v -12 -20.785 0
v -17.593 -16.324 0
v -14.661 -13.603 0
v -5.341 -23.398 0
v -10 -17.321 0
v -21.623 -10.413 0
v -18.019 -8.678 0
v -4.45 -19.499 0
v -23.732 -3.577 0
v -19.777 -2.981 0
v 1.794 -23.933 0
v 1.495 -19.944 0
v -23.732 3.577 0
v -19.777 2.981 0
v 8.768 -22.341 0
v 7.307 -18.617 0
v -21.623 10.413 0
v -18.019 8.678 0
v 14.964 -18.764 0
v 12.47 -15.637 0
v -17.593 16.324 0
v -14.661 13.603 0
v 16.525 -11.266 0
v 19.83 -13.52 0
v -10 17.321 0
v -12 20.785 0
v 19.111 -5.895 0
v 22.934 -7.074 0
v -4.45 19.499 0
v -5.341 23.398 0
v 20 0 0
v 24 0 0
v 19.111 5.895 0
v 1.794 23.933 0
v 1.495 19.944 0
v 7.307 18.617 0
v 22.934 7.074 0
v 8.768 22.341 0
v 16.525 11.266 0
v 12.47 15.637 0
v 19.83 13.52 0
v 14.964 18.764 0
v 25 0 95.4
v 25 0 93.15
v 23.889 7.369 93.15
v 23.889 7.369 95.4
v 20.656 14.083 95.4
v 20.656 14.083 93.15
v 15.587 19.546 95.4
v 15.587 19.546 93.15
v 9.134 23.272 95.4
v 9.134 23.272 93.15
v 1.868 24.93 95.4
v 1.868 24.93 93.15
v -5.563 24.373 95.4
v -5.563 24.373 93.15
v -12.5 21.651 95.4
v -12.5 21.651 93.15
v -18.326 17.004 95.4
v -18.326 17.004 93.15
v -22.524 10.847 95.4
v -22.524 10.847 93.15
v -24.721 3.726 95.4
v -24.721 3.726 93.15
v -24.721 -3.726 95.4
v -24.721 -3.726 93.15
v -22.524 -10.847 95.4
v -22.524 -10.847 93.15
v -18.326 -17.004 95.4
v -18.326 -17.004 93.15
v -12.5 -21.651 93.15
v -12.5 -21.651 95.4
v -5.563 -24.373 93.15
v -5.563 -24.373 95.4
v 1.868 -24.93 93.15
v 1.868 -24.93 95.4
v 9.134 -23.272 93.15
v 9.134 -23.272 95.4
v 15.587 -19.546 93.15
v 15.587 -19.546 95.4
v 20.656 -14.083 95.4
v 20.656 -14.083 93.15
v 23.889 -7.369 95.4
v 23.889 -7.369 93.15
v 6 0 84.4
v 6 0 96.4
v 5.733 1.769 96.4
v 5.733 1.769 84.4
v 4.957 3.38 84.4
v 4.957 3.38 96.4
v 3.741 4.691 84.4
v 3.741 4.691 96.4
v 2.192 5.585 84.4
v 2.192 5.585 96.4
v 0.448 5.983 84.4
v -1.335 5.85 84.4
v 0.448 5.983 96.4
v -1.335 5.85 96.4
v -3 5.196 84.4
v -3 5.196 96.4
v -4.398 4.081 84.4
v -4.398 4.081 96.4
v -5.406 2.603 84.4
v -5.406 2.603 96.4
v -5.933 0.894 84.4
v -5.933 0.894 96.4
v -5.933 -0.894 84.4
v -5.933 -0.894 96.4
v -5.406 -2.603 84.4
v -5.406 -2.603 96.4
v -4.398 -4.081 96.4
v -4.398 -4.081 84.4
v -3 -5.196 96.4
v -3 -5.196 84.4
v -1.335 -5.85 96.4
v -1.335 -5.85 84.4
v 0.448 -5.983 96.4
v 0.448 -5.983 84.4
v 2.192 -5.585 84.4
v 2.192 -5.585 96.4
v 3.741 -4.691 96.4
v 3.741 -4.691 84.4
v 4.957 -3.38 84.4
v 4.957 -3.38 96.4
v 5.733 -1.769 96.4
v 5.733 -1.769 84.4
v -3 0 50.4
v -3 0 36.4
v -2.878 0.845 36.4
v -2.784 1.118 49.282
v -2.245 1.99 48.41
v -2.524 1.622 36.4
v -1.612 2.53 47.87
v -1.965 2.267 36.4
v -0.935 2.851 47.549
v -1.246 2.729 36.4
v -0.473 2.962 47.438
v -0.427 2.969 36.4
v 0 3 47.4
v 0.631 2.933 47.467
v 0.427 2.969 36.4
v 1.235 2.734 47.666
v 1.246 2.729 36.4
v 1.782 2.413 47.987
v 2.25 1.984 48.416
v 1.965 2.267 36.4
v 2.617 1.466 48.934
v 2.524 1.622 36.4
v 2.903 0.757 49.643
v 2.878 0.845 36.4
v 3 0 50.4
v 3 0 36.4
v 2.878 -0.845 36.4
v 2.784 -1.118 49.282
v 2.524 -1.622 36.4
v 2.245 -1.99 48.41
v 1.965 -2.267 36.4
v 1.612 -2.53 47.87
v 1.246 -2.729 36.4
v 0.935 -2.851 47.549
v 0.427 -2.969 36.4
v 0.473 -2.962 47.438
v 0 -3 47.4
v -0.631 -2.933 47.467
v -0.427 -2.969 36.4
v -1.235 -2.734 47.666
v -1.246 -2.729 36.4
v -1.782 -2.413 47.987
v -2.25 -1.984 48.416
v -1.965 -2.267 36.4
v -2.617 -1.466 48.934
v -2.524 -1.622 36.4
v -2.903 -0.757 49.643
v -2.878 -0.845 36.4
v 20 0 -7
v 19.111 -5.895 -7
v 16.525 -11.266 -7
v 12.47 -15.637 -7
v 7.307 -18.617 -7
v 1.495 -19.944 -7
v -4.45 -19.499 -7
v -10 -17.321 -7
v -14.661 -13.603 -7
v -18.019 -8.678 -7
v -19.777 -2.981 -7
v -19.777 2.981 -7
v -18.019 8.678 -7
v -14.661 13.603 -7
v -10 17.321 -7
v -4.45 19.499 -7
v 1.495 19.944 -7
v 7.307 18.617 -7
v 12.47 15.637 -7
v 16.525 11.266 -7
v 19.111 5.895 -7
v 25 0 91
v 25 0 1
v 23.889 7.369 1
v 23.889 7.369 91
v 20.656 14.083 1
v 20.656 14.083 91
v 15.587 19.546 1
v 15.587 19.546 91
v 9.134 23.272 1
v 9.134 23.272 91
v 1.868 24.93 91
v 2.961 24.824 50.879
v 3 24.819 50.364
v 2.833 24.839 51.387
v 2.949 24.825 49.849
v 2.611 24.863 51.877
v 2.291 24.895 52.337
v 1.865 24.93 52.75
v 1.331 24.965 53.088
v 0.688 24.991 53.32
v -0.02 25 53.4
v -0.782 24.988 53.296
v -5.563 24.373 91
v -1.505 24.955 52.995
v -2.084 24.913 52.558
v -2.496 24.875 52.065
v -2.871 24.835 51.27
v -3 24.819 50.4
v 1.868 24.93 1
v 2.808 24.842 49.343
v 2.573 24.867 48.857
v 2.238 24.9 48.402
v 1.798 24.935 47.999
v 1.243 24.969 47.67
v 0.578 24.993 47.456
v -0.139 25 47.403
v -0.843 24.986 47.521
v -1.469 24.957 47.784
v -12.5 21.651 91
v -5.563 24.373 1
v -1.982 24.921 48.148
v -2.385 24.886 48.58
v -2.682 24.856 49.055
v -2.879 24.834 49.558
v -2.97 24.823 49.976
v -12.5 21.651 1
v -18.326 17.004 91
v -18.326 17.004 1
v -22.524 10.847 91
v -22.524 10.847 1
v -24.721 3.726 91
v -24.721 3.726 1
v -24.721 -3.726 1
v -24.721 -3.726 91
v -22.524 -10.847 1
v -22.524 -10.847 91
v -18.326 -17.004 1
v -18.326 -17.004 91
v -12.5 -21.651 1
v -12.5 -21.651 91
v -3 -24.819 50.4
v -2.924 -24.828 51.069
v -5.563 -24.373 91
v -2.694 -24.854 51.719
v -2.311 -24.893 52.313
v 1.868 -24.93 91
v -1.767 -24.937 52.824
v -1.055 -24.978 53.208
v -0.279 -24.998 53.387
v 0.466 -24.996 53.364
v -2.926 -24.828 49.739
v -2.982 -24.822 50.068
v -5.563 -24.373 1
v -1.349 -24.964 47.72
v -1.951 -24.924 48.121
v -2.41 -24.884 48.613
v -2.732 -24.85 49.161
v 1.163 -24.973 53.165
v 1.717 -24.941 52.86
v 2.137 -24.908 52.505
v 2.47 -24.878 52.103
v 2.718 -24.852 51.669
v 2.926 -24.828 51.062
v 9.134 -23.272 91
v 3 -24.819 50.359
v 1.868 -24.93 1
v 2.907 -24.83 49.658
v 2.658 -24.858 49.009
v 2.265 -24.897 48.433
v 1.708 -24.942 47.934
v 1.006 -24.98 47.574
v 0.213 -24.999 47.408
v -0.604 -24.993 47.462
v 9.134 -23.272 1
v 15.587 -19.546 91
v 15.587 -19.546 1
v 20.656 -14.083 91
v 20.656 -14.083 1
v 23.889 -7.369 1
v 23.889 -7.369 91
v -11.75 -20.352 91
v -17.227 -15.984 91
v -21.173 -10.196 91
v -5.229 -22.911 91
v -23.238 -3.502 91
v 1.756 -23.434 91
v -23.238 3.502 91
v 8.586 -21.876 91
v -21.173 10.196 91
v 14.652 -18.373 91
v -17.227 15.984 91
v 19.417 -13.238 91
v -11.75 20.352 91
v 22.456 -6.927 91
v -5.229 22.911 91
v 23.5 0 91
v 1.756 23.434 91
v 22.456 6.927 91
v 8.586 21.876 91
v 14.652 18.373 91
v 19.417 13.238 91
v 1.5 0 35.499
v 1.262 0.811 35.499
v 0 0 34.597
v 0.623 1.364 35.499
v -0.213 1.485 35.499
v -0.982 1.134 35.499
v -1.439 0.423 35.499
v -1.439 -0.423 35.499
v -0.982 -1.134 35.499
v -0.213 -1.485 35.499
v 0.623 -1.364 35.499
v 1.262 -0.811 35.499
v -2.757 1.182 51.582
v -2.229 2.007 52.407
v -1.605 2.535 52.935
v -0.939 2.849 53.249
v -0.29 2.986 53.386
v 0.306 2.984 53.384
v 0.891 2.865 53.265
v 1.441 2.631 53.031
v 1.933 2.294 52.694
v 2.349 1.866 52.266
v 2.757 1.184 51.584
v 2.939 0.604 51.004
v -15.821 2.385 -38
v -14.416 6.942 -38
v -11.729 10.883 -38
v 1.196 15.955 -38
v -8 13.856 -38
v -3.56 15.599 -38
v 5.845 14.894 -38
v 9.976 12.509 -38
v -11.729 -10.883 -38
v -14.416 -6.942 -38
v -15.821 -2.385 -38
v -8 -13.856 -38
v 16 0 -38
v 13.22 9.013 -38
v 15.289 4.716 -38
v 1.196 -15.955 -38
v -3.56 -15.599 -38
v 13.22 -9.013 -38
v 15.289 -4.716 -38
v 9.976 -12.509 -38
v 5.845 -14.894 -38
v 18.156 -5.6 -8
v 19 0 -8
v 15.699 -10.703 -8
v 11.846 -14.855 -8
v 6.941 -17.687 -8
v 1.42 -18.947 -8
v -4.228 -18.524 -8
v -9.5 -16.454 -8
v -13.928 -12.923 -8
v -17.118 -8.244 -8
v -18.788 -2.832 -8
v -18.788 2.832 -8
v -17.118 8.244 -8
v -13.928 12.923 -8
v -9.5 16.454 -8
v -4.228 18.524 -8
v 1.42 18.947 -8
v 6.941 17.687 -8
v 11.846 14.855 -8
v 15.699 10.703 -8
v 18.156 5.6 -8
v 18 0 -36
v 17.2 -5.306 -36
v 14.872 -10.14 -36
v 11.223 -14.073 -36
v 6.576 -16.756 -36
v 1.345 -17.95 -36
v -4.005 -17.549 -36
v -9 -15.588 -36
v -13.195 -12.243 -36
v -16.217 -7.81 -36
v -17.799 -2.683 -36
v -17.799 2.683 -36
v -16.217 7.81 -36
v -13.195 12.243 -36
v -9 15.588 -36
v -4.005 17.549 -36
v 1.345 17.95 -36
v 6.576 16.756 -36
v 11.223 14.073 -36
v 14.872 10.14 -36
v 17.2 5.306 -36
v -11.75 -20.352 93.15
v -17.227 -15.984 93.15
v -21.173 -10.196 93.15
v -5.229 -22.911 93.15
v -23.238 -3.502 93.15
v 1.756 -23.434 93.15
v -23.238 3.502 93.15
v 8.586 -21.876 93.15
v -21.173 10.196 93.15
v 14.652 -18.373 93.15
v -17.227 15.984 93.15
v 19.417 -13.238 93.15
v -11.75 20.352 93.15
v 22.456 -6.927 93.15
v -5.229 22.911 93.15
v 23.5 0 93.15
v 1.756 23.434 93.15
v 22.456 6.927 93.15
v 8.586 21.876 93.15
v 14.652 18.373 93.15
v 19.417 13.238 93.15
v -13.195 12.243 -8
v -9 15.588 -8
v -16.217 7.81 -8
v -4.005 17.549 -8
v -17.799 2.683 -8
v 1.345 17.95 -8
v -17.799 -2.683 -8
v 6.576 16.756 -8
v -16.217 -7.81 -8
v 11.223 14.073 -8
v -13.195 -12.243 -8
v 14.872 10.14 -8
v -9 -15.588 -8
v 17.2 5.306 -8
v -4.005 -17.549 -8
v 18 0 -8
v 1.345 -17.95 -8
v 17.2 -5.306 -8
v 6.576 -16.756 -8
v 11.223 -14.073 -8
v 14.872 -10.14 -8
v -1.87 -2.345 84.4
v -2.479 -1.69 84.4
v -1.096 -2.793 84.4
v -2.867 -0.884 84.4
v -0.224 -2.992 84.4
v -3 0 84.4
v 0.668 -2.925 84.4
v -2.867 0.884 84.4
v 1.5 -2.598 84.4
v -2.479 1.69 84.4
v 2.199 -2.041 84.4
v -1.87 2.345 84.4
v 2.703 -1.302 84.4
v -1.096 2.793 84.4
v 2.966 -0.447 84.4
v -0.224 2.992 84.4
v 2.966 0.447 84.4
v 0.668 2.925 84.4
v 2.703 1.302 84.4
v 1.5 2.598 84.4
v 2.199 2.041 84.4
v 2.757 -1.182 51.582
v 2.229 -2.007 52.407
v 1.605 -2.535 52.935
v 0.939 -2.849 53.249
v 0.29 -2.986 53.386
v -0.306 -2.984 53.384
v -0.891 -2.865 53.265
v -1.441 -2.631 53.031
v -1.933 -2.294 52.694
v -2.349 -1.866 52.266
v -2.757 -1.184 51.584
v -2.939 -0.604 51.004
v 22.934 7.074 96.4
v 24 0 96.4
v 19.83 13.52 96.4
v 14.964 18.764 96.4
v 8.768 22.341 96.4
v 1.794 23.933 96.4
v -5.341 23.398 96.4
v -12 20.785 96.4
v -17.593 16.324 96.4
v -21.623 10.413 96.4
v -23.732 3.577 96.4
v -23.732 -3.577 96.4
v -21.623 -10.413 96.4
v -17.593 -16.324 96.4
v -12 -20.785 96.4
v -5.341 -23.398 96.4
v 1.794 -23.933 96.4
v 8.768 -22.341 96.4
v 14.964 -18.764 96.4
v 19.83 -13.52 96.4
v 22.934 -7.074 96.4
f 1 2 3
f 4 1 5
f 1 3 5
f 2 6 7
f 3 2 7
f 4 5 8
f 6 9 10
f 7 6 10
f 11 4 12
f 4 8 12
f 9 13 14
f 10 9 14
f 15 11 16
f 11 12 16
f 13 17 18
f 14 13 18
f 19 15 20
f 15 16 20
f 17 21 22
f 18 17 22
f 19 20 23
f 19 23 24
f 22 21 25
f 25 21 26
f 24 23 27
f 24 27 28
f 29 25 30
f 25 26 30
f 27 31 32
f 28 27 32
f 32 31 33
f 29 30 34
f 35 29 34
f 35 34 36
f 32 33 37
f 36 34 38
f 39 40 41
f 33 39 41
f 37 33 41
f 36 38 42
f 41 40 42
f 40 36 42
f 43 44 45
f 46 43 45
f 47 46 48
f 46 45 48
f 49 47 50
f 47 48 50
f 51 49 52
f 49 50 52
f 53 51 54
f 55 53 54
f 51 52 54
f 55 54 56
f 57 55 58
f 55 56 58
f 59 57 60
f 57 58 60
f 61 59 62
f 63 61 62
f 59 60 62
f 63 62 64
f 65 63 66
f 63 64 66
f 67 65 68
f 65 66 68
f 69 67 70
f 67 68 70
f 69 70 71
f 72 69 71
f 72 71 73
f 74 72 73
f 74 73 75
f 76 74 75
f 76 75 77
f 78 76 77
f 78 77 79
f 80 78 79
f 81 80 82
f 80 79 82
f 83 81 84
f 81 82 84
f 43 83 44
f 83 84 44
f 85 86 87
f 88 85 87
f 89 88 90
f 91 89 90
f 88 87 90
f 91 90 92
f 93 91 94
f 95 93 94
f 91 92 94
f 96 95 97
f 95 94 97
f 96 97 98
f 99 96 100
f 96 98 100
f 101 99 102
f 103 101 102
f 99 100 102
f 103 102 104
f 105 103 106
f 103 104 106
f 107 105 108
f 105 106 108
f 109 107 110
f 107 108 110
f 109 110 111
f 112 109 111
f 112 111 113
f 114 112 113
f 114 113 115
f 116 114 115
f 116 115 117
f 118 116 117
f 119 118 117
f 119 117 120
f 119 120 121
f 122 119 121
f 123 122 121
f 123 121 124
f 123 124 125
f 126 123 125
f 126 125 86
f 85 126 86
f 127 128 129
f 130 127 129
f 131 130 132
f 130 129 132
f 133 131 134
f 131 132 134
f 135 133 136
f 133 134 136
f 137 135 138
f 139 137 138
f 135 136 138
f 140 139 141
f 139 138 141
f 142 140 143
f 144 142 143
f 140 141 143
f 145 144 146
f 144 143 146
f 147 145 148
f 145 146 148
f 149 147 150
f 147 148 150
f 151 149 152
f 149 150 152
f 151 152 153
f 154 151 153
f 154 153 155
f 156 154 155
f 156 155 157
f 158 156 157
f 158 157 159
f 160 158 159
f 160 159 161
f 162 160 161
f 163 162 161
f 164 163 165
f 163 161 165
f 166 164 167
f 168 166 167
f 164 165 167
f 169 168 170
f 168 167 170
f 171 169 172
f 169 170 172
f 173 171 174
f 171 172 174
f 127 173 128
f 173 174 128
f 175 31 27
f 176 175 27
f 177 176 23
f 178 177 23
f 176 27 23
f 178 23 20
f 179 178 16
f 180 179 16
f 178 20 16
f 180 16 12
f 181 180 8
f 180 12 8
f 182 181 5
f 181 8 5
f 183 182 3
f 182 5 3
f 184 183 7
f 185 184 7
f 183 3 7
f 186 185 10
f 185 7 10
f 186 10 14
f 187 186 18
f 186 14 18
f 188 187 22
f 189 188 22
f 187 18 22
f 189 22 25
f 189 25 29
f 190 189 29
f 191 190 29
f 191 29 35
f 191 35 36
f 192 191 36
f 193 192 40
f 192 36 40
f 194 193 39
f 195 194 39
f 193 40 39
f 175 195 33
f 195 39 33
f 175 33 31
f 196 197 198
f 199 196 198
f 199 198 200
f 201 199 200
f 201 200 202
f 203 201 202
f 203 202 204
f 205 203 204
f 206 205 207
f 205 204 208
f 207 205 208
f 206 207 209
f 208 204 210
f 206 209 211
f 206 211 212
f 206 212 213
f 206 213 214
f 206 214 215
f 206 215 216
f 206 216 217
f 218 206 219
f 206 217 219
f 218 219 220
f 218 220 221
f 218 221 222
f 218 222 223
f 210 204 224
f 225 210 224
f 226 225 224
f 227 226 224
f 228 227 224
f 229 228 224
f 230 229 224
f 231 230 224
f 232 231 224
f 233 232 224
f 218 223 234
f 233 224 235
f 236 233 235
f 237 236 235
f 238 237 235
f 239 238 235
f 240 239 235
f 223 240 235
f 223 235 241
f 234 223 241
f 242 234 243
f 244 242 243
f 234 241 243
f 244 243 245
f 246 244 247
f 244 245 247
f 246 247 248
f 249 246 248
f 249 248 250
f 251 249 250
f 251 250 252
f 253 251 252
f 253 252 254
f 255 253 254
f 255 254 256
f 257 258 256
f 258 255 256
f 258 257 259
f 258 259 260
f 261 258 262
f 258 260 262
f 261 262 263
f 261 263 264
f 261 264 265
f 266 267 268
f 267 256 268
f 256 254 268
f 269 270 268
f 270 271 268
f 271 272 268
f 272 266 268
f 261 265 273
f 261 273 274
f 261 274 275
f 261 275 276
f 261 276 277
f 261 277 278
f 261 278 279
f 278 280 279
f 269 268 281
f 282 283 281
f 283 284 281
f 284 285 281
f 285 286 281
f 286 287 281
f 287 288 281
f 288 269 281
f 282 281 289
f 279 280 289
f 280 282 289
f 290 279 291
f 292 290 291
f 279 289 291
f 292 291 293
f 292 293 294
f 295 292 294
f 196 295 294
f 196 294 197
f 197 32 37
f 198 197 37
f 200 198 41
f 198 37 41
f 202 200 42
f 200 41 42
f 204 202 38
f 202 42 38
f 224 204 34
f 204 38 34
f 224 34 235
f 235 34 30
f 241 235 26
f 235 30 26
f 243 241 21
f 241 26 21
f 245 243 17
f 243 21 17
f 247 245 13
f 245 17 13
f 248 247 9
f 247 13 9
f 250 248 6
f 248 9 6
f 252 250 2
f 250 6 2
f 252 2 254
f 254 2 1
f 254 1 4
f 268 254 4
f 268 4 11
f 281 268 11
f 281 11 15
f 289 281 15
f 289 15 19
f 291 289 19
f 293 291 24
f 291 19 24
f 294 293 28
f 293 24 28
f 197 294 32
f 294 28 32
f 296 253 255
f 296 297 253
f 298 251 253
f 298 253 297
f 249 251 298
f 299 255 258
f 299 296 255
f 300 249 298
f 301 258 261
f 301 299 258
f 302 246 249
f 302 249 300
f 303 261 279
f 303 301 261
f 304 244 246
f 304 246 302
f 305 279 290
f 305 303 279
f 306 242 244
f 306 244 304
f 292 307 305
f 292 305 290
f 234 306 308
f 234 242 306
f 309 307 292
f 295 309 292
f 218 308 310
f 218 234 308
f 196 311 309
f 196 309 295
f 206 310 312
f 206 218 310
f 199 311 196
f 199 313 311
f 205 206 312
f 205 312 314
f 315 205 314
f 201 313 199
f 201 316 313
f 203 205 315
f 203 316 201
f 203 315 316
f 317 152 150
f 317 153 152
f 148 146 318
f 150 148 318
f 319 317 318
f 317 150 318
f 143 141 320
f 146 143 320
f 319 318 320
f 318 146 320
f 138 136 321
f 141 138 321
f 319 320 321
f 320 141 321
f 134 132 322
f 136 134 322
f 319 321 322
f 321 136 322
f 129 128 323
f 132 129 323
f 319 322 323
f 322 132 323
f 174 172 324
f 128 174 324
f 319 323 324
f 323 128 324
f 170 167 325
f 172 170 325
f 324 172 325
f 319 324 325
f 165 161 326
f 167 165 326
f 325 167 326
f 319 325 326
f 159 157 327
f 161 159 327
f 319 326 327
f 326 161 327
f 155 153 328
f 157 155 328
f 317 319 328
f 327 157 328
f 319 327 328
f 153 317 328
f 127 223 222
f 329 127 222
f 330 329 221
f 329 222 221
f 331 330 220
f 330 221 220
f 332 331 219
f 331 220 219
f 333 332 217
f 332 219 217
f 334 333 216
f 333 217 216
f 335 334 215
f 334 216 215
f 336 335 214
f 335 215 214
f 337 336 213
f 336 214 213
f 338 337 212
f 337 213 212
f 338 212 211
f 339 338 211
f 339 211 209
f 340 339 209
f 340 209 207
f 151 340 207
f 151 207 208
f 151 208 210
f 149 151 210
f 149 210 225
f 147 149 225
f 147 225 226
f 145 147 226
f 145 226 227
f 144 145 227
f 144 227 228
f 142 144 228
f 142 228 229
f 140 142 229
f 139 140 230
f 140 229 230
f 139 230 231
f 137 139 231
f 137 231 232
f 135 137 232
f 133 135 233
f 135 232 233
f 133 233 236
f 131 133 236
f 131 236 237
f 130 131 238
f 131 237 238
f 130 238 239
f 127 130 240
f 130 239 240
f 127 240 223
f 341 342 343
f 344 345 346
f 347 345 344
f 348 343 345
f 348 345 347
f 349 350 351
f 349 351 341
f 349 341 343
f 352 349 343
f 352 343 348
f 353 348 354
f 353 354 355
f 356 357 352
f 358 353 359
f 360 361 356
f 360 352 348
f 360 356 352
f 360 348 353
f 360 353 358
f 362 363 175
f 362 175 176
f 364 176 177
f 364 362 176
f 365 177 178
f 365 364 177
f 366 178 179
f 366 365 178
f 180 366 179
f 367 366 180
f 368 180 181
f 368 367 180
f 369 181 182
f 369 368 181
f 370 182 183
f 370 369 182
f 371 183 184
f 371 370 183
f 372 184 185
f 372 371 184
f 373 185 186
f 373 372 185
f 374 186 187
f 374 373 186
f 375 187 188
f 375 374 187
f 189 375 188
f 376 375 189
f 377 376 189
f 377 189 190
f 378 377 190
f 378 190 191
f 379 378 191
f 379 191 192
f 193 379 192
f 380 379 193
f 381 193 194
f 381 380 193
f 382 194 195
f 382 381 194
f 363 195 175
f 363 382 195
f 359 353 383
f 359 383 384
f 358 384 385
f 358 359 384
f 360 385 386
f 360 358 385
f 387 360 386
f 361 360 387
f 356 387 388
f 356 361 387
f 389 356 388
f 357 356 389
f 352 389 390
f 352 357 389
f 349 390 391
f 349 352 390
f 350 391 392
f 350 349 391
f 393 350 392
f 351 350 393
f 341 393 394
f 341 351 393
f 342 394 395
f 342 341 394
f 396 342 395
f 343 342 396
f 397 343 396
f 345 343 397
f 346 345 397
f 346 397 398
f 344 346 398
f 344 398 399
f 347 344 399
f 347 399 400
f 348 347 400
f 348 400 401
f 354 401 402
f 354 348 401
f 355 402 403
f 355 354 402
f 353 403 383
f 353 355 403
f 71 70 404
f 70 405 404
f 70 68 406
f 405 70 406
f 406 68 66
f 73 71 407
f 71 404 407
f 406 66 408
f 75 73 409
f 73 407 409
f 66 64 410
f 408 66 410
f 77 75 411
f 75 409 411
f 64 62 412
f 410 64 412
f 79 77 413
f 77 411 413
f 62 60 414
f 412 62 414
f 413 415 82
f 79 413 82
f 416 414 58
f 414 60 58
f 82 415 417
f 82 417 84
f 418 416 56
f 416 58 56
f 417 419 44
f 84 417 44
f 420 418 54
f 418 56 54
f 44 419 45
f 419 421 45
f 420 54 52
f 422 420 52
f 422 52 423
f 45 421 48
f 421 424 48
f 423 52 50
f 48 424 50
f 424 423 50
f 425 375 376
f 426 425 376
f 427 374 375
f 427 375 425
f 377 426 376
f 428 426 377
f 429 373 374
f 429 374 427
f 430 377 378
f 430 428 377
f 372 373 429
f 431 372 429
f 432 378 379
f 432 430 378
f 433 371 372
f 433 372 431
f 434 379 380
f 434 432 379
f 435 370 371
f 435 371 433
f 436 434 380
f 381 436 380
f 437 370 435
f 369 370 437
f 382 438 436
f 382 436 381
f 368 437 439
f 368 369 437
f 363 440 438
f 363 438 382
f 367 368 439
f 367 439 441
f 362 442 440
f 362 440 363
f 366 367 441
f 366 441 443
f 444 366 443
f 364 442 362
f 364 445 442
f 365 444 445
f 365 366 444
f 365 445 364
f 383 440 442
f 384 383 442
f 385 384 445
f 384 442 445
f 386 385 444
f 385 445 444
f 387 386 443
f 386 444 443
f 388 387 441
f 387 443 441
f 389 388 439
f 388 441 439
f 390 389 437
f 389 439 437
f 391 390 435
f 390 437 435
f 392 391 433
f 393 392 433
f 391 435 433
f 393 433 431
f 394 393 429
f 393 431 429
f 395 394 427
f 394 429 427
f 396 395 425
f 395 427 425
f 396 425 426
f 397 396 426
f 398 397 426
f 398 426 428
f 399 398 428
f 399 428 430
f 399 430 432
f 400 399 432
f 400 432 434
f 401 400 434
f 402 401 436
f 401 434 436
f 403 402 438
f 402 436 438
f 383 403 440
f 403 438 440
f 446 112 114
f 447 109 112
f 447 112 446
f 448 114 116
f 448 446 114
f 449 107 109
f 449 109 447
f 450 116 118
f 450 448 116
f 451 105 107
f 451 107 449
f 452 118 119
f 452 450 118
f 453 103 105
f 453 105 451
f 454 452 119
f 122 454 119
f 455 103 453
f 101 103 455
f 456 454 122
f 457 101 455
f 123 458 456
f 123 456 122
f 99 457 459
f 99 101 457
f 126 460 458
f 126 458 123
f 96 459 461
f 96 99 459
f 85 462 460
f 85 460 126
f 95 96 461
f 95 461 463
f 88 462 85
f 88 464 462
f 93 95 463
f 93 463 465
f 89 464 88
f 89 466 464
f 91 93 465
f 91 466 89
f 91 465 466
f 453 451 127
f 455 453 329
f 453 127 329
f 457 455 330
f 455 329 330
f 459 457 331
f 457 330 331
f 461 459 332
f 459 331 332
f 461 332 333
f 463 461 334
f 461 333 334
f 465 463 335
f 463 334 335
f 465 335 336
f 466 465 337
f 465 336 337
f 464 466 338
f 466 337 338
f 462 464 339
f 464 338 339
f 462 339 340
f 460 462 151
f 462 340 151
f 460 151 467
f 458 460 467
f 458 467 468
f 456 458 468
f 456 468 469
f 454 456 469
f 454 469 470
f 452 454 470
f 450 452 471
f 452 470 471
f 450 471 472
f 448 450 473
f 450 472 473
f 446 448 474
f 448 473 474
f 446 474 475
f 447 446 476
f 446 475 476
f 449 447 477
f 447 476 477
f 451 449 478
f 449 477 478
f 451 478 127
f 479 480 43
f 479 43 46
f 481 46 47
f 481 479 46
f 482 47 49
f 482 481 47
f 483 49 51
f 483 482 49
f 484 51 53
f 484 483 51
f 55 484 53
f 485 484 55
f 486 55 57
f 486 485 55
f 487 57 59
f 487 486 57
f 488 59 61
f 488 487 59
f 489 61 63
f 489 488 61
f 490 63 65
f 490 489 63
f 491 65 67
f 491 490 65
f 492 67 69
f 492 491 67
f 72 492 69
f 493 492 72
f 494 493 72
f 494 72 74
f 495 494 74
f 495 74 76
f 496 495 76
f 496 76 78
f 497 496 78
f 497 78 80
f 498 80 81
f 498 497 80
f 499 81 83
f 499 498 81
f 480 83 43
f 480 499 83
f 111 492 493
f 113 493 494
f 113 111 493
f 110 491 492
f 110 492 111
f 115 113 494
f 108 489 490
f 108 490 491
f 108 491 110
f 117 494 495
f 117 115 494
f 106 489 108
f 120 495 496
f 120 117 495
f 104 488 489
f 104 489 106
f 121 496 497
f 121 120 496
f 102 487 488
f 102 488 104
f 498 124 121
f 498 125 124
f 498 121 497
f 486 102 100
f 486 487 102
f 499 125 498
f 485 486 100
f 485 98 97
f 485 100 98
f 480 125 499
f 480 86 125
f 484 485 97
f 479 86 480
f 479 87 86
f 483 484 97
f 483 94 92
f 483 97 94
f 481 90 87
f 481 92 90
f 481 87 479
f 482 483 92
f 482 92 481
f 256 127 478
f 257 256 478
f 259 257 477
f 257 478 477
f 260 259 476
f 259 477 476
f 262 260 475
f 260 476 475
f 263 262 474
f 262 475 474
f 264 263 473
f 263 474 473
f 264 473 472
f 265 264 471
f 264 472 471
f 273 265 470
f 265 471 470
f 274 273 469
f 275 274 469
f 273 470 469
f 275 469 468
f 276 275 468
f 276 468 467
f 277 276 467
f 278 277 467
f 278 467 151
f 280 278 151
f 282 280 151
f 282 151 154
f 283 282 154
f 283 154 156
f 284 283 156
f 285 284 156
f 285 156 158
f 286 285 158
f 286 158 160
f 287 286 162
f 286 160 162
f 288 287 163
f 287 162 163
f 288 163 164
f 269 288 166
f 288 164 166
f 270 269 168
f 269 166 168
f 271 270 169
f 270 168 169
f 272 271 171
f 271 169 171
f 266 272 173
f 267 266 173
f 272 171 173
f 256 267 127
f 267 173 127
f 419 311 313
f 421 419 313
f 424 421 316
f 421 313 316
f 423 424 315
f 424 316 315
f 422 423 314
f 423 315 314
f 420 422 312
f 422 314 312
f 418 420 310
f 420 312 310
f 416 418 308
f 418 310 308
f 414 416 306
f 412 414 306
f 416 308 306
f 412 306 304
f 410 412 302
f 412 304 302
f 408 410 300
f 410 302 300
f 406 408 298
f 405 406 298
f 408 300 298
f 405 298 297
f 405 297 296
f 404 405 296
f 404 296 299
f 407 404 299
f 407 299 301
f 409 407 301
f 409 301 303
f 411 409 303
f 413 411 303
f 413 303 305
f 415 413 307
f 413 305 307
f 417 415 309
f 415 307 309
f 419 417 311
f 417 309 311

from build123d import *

# Parameters (mm, degrees)
F0_R            = 25
F1_DEPTH        = 91
F2_R            = 23.5
F3_DEPTH        = 2.15
F4_R            = 25
F5_DEPTH        = 3.25
F6_SIZE         = 1
F7_R            = 20
F8_DEPTH        = 8
F9_R            = 18
F10_DEPTH       = 30
F11_SIZE        = 1
F12_SIZE        = 2
F14_D           = 6
F14_DEPTH       = 60
F14_CBORE_D     = 12
F14_CBORE_DEPTH = 12
F14_TIP         = 1.8025818571
F17_D           = 6


with BuildPart() as f1:
    # F0 (on Top) → F1 (new body)
    with BuildSketch(Plane.XY):
        Circle(F0_R)
    extrude(amount=F1_DEPTH)

    # F2 (on face) → F3 (join)
    with BuildSketch(Plane.XY.offset(91)):
        Circle(F2_R)
    extrude(amount=F3_DEPTH)

    # F4 (on face) → F5 (join)
    with BuildSketch(Plane.XY.offset(93.15)):
        Circle(F4_R)
    extrude(amount=F5_DEPTH)

    # F6
    f6_edges = [f1.edges().sort_by_distance(p)[0] for p in [
        (-25, 0, 96.4),
    ]]
    chamfer(f6_edges, length=F6_SIZE)

    # F7 (on face) → F8 (join)
    with BuildSketch(Plane(origin=(0, 0, 0), x_dir=(1, 0, 0), z_dir=(0, 0, -1))):
        Circle(F7_R)
    extrude(amount=F8_DEPTH)

    # F9 (on face) → F10 (join)
    with BuildSketch(Plane(origin=(0, 0, -8), x_dir=(1, 0, 0), z_dir=(0, 0, -1))):
        Circle(F9_R)
    extrude(amount=F10_DEPTH)

    # F11
    f11_edges = [f1.edges().sort_by_distance(p)[0] for p in [
        (-25, 0, 0),
        (-20, 0, -8),
    ]]
    chamfer(f11_edges, length=F11_SIZE)

    # F12
    f12_edges = [f1.edges().sort_by_distance(p)[0] for p in [
        (-18, 0, -38),
    ]]
    chamfer(f12_edges, length=F12_SIZE)

    # F14
    with Locations(Plane.XY.offset(96.4)):
        with Locations((0, 0)):
            CounterBoreHole(F14_D / 2, F14_CBORE_D / 2, F14_CBORE_DEPTH, depth=F14_DEPTH)
            with Locations((0, 0, -(F14_DEPTH + F14_TIP / 2))):  # 118° drill point
                Cone(0, F14_D / 2, F14_TIP, mode=Mode.SUBTRACT)

    # F17 (through all)
    with Locations(Plane.XZ.offset(25)):
        with Locations((0, 50.4)):
            Hole(F17_D / 2)


solid = f1.part
